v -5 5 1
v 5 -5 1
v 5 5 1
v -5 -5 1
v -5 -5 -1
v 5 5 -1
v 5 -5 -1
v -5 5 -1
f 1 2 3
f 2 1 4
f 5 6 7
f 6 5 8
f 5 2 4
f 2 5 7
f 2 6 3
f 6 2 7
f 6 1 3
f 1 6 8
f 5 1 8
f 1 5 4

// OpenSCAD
// file: base.scad
// Selftest fixture for scripts/lineage.sh — never printed, never gated as a
// design. Rendered only so `./scripts/lineage.sh selftest` can prove the
// derivative gate in scripts/gate.sh can still tell a working override from a
// silently-broken one on whatever OpenSCAD this machine has.
//
// This is an ordinary entry point, shaped like every design in designs/: it
// defines a module and calls it at the top level. It plays two parts in the
// selftest — the mesh a derivative's override has to differ from, and the
// NOT-base-safe half of the base-safety proof, since its top level emits
// geometry that a diamond would evaluate and union twice.

// Coarse on purpose: these renders exist to be hashed, not looked at, and a
// smooth cylinder would only make the selftest slower.
$fn = 8;

module lid() {
    cube([10, 10, 2], center = true);
}

lid();
// main file
// Selftest fixture for scripts/lineage.sh: the failure the override check
// exists to catch.
//
// `Lid` is not `lid`, so nothing here overrides anything — and OpenSCAD reports
// that in no way whatsoever. No WARNING, no ERROR, exit 0, and a watertight STL
// that printcheck scores 100/100. What you get is the base's part, unchanged,
// wearing the derivative's name. The single observable trace is that the mesh
// comes out byte-identical to base.scad's, which is the signature gate.sh keys
// on; if this fixture ever stops reproducing the base mesh exactly, the gate
// has lost the ability to see a misspelled override and the selftest is what
// says so before a derivative ships the wrong part.

include <base.scad>

module Lid() {
    cylinder(h = 2, r = 5, center = true);
}
